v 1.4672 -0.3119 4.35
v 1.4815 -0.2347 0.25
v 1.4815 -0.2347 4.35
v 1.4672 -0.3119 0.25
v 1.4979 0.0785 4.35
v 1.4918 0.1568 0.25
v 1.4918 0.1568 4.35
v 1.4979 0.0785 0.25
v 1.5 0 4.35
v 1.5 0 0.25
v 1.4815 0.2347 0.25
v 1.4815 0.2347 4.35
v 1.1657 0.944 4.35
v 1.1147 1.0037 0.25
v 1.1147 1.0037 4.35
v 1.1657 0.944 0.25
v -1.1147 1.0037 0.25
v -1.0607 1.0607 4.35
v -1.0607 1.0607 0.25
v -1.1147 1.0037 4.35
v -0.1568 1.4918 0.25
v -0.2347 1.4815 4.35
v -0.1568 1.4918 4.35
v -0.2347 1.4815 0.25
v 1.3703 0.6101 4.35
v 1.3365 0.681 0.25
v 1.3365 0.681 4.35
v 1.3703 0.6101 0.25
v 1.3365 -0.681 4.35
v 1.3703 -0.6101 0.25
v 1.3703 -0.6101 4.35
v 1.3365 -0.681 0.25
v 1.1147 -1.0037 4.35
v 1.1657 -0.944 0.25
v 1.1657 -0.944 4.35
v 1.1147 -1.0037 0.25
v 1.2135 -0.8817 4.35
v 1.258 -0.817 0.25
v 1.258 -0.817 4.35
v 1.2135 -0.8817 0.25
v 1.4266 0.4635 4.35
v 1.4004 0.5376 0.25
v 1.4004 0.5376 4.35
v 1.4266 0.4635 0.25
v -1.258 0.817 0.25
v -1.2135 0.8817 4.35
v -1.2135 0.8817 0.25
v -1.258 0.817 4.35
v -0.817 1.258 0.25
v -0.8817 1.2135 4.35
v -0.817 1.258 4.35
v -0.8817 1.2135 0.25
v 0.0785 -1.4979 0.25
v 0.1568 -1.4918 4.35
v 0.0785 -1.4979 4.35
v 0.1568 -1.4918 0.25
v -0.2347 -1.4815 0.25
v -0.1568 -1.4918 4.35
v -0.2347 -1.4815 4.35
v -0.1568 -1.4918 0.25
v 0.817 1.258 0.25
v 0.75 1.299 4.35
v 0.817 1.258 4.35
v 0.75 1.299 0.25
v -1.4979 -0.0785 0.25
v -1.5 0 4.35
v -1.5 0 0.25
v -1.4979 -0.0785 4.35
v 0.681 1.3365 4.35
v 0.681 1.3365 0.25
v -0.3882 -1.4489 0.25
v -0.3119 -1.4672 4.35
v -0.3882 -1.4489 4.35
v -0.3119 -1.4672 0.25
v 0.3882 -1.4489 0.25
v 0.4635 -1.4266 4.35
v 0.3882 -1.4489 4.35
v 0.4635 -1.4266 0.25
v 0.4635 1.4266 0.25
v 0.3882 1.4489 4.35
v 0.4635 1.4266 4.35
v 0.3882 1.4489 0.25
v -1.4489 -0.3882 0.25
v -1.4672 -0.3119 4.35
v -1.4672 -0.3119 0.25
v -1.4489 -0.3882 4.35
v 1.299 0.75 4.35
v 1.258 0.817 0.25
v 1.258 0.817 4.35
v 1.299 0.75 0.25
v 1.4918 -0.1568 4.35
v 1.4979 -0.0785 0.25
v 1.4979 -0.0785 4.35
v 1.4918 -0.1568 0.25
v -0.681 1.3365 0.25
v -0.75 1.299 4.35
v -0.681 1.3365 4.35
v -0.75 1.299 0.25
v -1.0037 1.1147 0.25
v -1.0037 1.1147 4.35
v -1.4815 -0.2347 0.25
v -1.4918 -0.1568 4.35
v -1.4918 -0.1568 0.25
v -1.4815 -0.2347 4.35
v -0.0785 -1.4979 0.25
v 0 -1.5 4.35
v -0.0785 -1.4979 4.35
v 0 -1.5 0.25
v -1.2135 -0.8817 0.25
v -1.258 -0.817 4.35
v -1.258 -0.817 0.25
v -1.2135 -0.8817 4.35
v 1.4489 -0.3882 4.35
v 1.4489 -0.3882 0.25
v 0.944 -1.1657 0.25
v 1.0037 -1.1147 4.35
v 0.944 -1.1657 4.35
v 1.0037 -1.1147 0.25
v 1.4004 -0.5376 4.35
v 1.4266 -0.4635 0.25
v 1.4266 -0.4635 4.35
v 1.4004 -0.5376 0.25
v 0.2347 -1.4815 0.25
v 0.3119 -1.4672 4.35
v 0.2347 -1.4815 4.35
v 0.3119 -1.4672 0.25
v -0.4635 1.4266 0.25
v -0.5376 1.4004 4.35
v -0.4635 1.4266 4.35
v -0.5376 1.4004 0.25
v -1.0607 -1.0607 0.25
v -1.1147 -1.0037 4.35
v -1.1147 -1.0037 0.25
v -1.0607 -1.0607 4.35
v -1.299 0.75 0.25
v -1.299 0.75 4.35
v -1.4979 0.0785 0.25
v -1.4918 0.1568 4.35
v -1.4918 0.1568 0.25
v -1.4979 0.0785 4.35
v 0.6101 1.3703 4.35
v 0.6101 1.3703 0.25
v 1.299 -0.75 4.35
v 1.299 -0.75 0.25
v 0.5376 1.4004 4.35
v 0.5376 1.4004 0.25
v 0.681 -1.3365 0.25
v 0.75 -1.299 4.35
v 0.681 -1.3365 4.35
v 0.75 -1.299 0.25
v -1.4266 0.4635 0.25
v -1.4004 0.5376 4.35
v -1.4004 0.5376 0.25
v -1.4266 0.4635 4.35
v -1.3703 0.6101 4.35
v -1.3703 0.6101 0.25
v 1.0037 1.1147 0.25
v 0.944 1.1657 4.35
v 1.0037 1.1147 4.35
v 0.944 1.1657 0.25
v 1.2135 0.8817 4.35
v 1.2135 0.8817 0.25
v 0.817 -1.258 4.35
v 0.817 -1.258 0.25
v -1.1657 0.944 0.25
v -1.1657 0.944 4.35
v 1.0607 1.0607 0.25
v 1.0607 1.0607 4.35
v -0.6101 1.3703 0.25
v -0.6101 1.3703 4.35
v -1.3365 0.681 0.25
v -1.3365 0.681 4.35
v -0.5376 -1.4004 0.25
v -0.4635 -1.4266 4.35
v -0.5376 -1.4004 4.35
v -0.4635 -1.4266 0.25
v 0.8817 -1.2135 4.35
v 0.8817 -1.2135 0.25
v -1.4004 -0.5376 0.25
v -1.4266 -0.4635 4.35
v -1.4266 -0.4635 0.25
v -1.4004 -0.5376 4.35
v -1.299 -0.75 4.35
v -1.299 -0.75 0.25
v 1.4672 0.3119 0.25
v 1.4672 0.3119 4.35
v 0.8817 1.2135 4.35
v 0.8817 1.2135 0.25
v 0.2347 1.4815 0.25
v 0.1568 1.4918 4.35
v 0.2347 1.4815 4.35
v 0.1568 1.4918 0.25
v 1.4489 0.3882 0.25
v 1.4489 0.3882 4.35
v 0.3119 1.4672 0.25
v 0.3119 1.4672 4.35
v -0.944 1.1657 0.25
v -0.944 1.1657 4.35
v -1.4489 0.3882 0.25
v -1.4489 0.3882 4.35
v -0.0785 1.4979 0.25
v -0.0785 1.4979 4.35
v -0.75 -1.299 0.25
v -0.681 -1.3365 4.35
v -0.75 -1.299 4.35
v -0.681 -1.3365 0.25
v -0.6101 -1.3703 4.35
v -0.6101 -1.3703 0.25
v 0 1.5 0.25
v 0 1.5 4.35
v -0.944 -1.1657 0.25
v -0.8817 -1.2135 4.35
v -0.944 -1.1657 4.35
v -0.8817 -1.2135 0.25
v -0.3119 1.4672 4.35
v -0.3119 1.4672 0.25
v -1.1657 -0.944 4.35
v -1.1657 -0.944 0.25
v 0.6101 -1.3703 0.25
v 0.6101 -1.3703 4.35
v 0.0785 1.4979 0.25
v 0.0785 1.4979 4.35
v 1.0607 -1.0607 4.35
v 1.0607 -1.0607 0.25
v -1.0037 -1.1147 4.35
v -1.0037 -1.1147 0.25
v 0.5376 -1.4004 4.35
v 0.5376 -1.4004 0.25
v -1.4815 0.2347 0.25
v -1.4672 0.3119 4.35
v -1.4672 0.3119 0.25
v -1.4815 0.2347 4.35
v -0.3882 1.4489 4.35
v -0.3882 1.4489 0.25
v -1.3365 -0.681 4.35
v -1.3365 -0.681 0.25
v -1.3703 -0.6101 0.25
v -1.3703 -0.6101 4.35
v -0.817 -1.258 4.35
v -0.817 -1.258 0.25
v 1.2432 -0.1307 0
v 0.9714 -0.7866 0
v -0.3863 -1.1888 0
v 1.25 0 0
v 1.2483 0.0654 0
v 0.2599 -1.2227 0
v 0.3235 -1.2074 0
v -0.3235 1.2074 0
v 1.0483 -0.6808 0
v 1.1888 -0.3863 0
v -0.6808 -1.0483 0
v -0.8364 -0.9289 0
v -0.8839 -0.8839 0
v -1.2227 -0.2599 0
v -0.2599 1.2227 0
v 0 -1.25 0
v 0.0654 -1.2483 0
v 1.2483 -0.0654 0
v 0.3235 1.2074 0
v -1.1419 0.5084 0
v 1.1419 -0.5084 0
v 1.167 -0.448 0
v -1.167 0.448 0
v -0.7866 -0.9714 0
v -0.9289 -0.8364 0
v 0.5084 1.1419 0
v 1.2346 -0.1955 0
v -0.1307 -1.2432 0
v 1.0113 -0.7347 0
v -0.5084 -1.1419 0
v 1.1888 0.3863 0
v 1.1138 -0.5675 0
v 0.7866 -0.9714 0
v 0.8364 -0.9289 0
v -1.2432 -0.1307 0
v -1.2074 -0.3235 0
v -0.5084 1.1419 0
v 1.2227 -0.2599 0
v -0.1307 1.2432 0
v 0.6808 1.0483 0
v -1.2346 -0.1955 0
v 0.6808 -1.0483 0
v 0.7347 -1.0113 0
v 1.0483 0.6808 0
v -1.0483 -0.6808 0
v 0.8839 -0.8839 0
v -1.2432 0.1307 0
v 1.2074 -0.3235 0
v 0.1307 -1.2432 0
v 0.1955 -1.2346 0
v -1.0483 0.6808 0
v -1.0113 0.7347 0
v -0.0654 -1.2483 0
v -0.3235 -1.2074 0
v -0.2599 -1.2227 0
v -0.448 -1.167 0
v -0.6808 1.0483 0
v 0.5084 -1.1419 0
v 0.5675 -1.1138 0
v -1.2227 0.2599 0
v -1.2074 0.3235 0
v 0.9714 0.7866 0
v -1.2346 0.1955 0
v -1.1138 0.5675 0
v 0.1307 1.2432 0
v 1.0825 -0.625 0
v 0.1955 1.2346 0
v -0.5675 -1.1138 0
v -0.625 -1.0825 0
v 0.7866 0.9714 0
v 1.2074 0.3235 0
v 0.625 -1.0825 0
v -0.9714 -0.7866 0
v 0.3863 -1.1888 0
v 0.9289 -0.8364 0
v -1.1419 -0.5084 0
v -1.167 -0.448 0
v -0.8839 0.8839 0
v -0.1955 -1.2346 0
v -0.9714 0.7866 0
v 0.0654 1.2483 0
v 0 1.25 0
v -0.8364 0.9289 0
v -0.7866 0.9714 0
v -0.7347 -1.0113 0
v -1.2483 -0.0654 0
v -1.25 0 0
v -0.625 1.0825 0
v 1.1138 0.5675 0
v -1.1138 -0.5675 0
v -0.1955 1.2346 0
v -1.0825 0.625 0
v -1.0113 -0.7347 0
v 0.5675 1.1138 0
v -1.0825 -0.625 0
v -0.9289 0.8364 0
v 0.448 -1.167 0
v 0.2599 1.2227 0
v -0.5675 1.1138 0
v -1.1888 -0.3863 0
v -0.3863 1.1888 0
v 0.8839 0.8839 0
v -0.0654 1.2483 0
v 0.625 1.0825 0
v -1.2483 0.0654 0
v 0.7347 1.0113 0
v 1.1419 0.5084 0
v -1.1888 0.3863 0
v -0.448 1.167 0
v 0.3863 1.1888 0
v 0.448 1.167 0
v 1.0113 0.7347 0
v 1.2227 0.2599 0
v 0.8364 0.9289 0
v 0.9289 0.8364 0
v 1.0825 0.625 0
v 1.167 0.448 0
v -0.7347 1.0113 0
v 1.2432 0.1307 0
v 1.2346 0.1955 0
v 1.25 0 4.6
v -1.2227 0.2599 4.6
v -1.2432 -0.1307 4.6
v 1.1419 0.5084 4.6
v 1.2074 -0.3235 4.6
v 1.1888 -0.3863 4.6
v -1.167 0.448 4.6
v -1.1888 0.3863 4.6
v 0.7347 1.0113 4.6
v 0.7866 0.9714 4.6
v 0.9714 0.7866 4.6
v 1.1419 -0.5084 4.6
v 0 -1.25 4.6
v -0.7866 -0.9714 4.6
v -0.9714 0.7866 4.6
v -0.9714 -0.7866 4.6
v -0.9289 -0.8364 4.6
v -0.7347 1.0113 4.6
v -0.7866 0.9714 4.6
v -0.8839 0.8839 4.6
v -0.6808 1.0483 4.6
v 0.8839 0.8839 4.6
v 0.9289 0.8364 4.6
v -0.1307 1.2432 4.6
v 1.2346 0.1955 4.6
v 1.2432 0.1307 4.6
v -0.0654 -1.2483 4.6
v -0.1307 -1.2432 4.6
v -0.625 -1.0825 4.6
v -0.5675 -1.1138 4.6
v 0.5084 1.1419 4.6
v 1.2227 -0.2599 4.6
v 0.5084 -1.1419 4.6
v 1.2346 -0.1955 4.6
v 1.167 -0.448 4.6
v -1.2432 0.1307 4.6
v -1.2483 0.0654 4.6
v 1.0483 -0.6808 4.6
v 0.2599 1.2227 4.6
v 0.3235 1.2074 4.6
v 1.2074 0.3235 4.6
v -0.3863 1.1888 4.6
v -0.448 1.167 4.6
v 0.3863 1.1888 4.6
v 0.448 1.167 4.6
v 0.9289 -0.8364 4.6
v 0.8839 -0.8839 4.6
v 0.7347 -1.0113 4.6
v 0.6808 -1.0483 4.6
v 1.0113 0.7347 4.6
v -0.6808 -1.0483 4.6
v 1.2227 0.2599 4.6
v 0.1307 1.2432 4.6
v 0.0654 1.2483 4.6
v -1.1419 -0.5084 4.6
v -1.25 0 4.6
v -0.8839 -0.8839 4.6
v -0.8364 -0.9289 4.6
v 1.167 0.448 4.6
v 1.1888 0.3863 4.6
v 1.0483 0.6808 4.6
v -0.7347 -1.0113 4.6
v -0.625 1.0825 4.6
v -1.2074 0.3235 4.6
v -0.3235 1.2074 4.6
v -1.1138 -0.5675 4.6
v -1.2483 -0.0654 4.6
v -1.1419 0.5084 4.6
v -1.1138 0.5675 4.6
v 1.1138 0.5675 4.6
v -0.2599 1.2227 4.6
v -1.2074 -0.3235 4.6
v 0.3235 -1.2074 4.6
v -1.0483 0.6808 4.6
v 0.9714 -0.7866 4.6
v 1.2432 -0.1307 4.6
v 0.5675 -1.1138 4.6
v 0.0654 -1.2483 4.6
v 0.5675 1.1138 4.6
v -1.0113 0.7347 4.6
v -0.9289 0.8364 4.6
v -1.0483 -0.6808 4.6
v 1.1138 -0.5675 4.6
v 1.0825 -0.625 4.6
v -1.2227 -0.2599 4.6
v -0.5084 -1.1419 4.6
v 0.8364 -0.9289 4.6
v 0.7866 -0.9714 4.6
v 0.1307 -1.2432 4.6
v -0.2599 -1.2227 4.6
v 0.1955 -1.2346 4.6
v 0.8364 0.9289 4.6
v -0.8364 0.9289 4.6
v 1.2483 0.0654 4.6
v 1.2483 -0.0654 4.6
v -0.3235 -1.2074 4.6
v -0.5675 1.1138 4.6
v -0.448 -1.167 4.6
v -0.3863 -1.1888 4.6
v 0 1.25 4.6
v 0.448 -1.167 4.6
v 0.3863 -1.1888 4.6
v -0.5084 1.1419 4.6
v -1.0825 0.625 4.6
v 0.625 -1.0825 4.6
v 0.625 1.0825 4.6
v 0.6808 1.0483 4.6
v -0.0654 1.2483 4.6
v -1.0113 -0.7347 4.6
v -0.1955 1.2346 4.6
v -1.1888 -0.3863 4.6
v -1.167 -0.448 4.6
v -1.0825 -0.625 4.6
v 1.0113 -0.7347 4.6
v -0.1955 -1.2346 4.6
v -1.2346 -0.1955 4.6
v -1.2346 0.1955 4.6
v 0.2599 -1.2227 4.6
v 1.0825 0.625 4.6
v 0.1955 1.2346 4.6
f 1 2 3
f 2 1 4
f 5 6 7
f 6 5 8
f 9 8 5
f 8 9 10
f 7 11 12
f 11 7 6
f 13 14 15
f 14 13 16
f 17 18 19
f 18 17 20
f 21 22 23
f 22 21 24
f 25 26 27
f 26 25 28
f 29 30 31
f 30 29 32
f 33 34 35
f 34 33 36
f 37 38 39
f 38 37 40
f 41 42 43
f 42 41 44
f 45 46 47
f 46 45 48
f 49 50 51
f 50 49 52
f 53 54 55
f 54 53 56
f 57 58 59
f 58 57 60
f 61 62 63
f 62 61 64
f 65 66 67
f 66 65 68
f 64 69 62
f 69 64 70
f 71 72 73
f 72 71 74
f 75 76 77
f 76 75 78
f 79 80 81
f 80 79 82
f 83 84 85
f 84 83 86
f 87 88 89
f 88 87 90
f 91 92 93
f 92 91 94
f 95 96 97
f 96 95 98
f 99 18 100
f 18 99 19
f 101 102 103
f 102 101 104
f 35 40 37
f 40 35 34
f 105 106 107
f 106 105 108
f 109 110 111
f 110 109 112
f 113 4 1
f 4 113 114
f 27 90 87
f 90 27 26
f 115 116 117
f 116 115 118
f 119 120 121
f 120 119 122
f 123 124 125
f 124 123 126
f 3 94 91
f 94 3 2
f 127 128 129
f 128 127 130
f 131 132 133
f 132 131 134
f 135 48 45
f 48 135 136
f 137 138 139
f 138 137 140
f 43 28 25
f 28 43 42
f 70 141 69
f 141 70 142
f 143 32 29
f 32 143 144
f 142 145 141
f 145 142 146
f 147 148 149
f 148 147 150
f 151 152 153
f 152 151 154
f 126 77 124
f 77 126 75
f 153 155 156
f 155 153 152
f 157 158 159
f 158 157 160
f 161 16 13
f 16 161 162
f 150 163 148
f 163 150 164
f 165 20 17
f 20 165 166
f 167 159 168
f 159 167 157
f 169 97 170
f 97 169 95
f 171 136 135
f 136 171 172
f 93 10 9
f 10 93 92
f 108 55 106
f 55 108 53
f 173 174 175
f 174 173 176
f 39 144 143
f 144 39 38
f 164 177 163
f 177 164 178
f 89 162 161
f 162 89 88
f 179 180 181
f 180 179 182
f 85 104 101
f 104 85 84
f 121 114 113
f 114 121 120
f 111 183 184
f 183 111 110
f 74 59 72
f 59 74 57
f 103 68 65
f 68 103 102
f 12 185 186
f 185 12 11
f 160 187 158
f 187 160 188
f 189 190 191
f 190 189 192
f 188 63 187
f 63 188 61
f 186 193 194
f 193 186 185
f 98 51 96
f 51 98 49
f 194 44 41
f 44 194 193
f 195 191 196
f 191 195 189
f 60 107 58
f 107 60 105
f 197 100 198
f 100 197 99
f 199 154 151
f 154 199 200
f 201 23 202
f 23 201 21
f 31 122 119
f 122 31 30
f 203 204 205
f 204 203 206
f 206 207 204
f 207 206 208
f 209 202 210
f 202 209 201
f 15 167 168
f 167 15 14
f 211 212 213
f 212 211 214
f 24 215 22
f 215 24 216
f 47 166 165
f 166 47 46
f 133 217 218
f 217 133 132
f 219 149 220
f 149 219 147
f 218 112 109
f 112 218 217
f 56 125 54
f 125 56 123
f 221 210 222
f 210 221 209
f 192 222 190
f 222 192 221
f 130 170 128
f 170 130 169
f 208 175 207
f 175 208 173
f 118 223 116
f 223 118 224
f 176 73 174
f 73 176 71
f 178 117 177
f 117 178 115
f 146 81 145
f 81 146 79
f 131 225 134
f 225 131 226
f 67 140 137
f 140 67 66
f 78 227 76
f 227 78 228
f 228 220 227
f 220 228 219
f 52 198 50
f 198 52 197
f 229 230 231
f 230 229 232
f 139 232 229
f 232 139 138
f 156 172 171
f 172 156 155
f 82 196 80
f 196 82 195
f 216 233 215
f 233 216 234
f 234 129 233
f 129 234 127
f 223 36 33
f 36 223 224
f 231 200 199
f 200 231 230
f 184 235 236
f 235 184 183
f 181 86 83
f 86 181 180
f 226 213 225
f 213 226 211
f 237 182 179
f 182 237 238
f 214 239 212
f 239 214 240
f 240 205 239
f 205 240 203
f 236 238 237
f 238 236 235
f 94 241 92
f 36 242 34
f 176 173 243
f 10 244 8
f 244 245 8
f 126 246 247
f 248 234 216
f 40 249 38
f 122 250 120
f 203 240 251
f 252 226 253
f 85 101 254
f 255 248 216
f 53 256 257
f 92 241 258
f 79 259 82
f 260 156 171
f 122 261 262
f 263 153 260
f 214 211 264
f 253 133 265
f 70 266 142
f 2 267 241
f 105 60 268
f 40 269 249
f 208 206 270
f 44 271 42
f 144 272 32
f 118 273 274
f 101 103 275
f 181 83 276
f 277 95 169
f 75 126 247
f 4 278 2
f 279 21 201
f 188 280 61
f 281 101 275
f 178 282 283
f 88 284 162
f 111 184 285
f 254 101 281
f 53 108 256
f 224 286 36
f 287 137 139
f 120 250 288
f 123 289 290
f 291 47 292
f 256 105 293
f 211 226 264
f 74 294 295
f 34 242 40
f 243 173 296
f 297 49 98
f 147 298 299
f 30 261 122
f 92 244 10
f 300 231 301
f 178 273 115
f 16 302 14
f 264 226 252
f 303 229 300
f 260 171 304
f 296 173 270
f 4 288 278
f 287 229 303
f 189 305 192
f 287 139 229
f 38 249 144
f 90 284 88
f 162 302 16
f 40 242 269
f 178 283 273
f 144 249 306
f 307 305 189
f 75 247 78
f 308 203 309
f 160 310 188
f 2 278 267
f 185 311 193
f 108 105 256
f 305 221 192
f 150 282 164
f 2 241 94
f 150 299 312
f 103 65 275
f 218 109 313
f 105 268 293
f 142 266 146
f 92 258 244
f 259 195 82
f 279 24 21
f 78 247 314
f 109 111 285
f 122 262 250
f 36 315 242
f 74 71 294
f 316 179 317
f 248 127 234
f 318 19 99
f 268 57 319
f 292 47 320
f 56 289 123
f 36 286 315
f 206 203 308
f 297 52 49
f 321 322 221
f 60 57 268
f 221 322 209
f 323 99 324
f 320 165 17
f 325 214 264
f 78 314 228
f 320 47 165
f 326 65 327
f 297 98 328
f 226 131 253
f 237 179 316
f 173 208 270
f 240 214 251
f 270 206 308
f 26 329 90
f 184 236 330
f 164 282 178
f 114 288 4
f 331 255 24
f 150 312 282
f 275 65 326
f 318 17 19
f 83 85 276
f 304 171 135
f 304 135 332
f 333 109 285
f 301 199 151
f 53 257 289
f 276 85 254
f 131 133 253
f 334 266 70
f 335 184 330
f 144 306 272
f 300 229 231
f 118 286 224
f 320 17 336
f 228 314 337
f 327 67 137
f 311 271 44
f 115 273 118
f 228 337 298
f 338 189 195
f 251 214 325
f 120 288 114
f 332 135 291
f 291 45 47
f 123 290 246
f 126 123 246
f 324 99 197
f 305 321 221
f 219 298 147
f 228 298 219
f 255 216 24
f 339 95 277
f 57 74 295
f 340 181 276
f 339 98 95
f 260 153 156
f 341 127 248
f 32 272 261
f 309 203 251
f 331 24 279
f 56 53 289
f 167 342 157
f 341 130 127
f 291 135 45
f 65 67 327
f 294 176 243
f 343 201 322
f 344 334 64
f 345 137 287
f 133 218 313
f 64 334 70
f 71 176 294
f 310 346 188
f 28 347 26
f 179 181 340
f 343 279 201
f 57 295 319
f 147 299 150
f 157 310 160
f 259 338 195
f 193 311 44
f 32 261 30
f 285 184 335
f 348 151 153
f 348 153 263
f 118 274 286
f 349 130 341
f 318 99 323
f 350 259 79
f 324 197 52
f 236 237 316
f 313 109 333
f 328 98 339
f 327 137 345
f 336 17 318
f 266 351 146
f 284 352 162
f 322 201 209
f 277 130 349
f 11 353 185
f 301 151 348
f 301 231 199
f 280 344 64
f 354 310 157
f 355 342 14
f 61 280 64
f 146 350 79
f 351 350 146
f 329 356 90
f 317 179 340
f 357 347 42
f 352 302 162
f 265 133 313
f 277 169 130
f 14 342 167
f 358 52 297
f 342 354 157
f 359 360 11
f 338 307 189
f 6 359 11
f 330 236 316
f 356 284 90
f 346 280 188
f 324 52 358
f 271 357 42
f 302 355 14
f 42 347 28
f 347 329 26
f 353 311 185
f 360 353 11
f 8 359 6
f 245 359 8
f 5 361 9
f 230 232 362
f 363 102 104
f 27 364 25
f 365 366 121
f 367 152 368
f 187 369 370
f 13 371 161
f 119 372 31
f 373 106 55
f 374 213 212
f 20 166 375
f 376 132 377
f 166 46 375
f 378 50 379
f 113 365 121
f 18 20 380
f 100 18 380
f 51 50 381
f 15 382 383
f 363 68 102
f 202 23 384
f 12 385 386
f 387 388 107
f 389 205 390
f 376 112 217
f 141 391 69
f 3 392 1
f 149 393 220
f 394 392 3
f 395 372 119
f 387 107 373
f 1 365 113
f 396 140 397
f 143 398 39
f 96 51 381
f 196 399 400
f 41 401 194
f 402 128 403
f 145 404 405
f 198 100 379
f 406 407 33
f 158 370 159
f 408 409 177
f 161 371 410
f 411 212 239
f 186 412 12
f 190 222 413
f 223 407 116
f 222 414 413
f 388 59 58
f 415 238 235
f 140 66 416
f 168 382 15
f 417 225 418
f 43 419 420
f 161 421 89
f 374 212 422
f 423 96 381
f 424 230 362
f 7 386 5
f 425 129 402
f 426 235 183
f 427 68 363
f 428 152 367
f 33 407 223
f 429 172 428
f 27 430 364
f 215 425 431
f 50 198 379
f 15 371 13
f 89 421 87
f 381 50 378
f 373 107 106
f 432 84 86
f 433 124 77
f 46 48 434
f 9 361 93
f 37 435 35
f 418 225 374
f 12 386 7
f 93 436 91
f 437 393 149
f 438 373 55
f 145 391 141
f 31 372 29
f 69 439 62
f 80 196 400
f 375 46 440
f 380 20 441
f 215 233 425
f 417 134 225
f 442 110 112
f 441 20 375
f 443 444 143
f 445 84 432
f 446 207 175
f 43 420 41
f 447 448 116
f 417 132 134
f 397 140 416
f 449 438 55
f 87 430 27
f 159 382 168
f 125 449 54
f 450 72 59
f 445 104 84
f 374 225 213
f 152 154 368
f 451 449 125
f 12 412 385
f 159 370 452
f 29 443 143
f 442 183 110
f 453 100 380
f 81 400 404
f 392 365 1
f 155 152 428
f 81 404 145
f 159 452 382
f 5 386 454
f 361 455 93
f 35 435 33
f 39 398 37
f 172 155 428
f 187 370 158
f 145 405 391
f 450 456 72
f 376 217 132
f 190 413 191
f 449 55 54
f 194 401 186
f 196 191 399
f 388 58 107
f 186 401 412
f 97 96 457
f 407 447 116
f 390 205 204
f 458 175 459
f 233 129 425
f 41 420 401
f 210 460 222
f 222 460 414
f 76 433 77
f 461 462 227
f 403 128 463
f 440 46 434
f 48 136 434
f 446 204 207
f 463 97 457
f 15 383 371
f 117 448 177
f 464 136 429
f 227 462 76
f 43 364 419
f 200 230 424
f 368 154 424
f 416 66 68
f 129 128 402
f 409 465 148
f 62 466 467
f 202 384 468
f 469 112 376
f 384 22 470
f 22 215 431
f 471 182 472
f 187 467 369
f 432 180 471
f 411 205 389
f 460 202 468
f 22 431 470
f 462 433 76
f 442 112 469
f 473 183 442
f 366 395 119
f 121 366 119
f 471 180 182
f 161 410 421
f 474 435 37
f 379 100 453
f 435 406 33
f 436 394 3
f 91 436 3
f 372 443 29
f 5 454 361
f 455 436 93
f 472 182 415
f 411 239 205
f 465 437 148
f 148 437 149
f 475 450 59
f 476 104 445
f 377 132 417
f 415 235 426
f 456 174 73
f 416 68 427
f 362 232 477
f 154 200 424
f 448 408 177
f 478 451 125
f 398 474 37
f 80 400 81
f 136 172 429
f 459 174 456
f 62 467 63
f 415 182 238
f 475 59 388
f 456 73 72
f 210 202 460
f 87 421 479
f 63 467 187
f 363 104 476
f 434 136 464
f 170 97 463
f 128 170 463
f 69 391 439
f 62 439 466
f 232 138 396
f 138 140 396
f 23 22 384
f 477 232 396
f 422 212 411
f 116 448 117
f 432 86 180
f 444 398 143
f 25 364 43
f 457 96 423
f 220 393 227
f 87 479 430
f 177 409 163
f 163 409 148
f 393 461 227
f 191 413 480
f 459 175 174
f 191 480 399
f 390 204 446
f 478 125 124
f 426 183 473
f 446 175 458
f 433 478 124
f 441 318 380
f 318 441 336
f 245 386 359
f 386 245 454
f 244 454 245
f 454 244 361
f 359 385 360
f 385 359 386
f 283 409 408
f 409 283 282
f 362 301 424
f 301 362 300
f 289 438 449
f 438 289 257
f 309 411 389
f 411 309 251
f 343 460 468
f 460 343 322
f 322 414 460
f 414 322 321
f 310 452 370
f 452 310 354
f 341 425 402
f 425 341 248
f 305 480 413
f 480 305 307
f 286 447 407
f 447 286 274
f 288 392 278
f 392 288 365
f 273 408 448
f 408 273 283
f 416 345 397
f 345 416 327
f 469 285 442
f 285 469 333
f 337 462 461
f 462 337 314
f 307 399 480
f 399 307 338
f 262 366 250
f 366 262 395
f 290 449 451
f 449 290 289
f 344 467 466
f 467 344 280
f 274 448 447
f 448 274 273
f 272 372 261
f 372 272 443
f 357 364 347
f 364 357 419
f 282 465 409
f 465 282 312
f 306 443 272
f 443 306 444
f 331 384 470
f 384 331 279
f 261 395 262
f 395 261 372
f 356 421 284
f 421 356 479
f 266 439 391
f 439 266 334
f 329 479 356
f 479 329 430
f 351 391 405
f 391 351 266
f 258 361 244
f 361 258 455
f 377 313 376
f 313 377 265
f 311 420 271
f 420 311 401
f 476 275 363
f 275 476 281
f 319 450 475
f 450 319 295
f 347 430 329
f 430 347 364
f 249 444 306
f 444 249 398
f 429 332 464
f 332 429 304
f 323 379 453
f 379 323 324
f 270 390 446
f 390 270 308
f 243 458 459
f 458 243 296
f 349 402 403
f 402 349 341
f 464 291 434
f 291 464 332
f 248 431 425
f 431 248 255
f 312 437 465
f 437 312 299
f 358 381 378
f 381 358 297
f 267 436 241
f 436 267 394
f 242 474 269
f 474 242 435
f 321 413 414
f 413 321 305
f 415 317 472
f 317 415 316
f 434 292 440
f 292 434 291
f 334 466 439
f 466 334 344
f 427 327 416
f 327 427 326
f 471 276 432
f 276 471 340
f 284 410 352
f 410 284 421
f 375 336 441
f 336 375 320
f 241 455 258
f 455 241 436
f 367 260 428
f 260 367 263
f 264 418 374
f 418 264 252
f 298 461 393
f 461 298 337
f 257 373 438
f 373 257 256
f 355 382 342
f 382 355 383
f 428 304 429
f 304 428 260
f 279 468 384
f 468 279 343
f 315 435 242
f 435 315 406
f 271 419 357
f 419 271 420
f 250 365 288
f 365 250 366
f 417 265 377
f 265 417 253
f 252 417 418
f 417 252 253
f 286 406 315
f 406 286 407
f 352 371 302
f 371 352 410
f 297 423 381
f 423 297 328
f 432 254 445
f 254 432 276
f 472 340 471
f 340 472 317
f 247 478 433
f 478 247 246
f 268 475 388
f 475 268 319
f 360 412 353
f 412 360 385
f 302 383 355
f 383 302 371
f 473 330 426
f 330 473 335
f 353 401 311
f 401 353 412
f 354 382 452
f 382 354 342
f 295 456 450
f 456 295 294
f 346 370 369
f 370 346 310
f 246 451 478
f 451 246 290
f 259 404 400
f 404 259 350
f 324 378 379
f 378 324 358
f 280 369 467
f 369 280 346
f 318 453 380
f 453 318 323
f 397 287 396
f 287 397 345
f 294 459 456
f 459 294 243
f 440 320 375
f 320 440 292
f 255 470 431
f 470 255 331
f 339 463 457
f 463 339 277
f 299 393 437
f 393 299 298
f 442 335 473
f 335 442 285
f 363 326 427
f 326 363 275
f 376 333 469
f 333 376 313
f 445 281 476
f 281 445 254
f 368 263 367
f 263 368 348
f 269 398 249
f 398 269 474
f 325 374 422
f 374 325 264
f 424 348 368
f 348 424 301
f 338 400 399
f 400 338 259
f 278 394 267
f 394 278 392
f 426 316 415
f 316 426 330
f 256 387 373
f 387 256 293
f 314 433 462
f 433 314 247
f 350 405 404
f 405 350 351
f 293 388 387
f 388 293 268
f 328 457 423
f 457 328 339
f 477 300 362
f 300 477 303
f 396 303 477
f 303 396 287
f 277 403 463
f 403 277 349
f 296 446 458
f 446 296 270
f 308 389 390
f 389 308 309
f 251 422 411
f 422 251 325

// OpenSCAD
$fn = 120;

// Threaded heat-set insert (simplified geometric model)
// Outer diameter: 3.0mm
// Length: 4.6mm
// Intended for M3 screws (internal hole sized accordingly)

od = 3.0;
len = 4.6;

// Typical M3 heat-set insert minor diameter is around 3.0mm thread major,
// but internal clearance/drill for modeling: ~2.5mm
id = 2.5;

// Optional small lead-in chamfers
chamfer = 0.25;

module insert_body() {
    // Main cylinder with slight chamfers
    union() {
        // Main section
        translate([0,0,chamfer])
            cylinder(h = len - 2*chamfer, d = od);

        // Bottom chamfer
        cylinder(h = chamfer, d1 = od - 2*chamfer, d2 = od);

        // Top chamfer
        translate([0,0,len - chamfer])
            cylinder(h = chamfer, d1 = od, d2 = od - 2*chamfer);
    }
}

module internal_hole() {
    // Through hole
    translate([0,0,-0.2])
        cylinder(h = len + 0.4, d = id);
}

difference() {
    insert_body();
    internal_hole();
}
